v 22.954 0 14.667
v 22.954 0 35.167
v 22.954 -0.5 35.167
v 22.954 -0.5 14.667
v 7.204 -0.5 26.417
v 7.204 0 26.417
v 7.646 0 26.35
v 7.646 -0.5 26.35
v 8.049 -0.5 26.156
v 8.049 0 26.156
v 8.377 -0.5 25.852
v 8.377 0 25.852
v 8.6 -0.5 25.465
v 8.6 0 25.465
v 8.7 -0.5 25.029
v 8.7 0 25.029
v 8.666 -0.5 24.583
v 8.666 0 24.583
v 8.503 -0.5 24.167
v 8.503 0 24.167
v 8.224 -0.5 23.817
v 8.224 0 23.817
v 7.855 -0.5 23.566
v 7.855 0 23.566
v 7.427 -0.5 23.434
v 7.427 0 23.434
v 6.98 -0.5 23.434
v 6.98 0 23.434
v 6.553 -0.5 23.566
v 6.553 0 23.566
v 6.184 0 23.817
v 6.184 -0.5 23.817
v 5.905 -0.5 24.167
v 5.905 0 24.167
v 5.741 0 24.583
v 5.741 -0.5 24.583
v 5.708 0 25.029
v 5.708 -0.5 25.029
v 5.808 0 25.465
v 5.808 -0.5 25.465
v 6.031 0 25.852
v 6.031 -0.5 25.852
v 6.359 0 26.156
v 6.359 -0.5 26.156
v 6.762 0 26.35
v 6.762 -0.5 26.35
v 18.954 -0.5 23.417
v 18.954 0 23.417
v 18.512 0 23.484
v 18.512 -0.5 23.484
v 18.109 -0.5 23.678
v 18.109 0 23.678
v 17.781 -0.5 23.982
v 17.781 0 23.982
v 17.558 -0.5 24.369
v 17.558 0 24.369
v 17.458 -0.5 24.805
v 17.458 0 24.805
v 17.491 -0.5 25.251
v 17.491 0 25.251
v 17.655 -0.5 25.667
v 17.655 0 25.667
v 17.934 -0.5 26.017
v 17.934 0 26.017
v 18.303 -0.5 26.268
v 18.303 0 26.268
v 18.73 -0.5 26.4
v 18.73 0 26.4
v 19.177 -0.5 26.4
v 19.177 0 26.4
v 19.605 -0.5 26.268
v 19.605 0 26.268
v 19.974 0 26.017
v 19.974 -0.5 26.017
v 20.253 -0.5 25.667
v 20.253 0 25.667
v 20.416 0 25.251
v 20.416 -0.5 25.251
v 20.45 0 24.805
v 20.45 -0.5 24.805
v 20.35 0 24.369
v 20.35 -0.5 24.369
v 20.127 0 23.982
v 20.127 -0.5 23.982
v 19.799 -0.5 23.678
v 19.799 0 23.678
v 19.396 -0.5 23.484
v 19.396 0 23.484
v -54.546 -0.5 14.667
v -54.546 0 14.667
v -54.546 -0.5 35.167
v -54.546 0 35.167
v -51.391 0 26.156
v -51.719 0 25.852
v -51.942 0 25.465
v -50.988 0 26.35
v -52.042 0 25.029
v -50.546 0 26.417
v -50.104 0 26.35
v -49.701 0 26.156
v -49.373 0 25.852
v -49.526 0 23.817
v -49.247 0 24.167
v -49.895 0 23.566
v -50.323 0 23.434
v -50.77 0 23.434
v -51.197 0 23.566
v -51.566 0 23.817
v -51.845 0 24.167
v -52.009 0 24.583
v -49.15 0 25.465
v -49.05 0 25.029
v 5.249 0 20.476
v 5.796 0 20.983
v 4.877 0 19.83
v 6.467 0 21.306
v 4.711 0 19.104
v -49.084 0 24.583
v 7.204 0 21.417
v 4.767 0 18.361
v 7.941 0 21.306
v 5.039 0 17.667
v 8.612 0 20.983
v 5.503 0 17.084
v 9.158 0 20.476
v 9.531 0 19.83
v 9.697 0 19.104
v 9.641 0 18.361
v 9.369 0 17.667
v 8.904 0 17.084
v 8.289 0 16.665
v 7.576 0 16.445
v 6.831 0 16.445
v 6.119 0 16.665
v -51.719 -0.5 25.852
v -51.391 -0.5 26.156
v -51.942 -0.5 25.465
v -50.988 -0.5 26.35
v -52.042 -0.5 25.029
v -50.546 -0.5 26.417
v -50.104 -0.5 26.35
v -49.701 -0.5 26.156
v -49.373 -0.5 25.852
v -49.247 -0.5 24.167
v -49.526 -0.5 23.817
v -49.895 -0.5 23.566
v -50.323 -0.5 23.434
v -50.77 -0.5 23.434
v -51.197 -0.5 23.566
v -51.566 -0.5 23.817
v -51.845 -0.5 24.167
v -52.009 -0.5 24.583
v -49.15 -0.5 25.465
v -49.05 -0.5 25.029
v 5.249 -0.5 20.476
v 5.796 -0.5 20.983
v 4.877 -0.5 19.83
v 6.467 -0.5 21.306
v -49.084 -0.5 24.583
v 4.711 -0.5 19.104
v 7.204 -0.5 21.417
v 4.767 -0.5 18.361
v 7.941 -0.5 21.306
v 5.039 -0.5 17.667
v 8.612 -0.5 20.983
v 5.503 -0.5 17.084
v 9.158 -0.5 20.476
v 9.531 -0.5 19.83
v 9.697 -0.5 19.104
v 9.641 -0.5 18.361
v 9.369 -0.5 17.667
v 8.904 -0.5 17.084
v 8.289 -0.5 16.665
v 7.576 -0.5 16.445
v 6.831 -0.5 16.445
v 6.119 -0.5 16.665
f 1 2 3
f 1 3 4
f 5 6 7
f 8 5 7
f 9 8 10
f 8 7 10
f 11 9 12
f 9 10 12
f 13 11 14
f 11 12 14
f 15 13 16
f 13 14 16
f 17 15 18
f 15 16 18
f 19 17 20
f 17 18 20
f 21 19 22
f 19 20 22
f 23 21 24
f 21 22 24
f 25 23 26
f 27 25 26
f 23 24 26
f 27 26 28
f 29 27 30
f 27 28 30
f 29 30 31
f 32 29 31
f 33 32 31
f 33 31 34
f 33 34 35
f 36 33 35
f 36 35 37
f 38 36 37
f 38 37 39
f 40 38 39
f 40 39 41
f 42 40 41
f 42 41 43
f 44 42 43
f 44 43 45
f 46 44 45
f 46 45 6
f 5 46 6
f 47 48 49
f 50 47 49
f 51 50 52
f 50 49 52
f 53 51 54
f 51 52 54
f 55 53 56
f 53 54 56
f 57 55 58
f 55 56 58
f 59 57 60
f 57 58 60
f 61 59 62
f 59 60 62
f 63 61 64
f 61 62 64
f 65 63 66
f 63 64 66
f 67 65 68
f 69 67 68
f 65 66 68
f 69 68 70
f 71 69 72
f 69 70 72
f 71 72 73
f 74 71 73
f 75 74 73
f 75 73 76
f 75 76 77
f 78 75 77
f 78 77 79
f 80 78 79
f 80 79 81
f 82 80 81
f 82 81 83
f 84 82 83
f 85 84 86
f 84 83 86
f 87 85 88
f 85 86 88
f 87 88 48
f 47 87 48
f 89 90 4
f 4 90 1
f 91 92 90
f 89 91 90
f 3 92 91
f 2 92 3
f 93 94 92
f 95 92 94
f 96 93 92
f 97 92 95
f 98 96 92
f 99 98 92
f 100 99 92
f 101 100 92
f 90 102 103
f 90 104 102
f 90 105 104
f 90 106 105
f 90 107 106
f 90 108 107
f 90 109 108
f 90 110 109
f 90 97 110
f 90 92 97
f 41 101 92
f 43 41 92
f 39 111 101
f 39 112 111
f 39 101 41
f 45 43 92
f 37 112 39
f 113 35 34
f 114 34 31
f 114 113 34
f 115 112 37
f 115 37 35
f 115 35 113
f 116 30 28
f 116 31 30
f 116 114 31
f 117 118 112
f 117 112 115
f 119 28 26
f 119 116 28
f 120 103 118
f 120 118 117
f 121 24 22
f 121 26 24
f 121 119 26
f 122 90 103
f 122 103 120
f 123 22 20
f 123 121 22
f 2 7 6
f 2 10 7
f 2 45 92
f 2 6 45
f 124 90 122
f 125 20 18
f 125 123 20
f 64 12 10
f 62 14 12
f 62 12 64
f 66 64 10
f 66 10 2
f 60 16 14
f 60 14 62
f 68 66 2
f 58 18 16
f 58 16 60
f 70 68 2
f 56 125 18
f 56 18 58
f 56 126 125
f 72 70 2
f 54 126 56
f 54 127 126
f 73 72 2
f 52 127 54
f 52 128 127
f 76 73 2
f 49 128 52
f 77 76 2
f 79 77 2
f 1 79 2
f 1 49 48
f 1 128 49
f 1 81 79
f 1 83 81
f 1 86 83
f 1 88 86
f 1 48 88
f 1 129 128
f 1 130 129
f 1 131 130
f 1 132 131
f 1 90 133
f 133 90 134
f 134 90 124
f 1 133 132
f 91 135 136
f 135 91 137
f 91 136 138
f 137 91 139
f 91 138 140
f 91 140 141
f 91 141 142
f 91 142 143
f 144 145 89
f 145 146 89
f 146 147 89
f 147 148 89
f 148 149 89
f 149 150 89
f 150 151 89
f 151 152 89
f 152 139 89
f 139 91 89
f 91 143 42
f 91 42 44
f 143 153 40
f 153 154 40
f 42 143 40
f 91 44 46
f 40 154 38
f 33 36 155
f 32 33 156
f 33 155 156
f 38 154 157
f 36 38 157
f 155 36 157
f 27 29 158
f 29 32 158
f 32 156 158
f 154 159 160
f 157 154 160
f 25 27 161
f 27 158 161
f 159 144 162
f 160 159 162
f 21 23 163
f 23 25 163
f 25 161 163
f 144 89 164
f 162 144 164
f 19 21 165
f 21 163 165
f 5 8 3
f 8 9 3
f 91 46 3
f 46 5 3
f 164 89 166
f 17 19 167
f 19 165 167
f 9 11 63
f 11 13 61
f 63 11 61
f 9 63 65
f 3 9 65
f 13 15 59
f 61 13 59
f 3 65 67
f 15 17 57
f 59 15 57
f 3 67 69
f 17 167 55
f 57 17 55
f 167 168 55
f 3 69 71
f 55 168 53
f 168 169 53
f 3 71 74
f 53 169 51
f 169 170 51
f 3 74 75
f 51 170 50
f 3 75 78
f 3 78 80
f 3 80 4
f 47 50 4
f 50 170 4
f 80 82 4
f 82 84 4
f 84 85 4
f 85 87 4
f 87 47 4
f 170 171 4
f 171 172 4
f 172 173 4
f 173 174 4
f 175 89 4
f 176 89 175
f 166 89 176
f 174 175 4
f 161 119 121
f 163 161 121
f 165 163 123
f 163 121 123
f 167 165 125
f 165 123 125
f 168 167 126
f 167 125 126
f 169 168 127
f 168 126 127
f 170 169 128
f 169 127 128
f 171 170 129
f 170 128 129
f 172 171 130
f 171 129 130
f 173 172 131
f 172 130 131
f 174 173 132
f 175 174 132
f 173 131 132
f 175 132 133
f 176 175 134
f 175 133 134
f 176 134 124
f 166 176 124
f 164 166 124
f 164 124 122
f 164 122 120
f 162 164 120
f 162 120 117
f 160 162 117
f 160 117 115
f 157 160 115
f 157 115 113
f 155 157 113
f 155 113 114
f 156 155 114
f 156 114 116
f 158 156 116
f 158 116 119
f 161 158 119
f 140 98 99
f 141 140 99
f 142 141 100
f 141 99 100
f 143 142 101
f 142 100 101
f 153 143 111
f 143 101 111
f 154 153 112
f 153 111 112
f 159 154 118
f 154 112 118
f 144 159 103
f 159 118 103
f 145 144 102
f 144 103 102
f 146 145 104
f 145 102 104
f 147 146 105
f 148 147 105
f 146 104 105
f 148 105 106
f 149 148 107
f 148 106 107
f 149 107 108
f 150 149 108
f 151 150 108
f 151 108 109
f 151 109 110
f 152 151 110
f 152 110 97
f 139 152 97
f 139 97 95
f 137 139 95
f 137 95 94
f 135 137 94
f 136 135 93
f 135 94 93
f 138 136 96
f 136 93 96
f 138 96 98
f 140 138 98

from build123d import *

# Parameters (mm, degrees)
CROQUIS1_W            = 77.5
CROQUIS1_H            = 20.5
CROQUIS1_R            = 1.5
BRIDA_BASE1_DEPTH     = 0.5
CROQUIS2_R            = 1.5
CROQUIS2_R_2          = 2.5
CORTAR_EXTRUIR1_DEPTH = 10


# Sheet-metal steps are written as plain solids
with BuildPart() as part:
    # Croquis1 → Brida base1 (new body)
    with BuildSketch(Plane(origin=(0, 0, 0), x_dir=(1, 0, 0), z_dir=(0, 1, 0))):
        with Locations((-15.796159052, -24.916988156)):
            Rectangle(CROQUIS1_W, CROQUIS1_H)
        with Locations(Location((-50.546159052, -24.916988156, 0), (0, 0, 270))):
            Circle(CROQUIS1_R, mode=Mode.SUBTRACT)
        with Locations(Location((18.953840948, -24.916988156, 0), (0, 0, 90))):
            Circle(CROQUIS1_R, mode=Mode.SUBTRACT)
    extrude(amount=-BRIDA_BASE1_DEPTH)

    # Croquis2 → Cortar-Extruir1 (cut)
    with BuildSketch(Plane(origin=(0, 0, 0), x_dir=(-1, 0, 0), z_dir=(0, 1, 0))):
        with Locations(Location((-7.203840948, 24.916988156, 0), (0, 0, 90))):
            Circle(CROQUIS2_R)
        with Locations(Location((-7.203840948, 18.916988156, 0), (0, 0, 90))):
            Circle(CROQUIS2_R_2)
    extrude(amount=-CORTAR_EXTRUIR1_DEPTH, mode=Mode.SUBTRACT)


solid = part.part
